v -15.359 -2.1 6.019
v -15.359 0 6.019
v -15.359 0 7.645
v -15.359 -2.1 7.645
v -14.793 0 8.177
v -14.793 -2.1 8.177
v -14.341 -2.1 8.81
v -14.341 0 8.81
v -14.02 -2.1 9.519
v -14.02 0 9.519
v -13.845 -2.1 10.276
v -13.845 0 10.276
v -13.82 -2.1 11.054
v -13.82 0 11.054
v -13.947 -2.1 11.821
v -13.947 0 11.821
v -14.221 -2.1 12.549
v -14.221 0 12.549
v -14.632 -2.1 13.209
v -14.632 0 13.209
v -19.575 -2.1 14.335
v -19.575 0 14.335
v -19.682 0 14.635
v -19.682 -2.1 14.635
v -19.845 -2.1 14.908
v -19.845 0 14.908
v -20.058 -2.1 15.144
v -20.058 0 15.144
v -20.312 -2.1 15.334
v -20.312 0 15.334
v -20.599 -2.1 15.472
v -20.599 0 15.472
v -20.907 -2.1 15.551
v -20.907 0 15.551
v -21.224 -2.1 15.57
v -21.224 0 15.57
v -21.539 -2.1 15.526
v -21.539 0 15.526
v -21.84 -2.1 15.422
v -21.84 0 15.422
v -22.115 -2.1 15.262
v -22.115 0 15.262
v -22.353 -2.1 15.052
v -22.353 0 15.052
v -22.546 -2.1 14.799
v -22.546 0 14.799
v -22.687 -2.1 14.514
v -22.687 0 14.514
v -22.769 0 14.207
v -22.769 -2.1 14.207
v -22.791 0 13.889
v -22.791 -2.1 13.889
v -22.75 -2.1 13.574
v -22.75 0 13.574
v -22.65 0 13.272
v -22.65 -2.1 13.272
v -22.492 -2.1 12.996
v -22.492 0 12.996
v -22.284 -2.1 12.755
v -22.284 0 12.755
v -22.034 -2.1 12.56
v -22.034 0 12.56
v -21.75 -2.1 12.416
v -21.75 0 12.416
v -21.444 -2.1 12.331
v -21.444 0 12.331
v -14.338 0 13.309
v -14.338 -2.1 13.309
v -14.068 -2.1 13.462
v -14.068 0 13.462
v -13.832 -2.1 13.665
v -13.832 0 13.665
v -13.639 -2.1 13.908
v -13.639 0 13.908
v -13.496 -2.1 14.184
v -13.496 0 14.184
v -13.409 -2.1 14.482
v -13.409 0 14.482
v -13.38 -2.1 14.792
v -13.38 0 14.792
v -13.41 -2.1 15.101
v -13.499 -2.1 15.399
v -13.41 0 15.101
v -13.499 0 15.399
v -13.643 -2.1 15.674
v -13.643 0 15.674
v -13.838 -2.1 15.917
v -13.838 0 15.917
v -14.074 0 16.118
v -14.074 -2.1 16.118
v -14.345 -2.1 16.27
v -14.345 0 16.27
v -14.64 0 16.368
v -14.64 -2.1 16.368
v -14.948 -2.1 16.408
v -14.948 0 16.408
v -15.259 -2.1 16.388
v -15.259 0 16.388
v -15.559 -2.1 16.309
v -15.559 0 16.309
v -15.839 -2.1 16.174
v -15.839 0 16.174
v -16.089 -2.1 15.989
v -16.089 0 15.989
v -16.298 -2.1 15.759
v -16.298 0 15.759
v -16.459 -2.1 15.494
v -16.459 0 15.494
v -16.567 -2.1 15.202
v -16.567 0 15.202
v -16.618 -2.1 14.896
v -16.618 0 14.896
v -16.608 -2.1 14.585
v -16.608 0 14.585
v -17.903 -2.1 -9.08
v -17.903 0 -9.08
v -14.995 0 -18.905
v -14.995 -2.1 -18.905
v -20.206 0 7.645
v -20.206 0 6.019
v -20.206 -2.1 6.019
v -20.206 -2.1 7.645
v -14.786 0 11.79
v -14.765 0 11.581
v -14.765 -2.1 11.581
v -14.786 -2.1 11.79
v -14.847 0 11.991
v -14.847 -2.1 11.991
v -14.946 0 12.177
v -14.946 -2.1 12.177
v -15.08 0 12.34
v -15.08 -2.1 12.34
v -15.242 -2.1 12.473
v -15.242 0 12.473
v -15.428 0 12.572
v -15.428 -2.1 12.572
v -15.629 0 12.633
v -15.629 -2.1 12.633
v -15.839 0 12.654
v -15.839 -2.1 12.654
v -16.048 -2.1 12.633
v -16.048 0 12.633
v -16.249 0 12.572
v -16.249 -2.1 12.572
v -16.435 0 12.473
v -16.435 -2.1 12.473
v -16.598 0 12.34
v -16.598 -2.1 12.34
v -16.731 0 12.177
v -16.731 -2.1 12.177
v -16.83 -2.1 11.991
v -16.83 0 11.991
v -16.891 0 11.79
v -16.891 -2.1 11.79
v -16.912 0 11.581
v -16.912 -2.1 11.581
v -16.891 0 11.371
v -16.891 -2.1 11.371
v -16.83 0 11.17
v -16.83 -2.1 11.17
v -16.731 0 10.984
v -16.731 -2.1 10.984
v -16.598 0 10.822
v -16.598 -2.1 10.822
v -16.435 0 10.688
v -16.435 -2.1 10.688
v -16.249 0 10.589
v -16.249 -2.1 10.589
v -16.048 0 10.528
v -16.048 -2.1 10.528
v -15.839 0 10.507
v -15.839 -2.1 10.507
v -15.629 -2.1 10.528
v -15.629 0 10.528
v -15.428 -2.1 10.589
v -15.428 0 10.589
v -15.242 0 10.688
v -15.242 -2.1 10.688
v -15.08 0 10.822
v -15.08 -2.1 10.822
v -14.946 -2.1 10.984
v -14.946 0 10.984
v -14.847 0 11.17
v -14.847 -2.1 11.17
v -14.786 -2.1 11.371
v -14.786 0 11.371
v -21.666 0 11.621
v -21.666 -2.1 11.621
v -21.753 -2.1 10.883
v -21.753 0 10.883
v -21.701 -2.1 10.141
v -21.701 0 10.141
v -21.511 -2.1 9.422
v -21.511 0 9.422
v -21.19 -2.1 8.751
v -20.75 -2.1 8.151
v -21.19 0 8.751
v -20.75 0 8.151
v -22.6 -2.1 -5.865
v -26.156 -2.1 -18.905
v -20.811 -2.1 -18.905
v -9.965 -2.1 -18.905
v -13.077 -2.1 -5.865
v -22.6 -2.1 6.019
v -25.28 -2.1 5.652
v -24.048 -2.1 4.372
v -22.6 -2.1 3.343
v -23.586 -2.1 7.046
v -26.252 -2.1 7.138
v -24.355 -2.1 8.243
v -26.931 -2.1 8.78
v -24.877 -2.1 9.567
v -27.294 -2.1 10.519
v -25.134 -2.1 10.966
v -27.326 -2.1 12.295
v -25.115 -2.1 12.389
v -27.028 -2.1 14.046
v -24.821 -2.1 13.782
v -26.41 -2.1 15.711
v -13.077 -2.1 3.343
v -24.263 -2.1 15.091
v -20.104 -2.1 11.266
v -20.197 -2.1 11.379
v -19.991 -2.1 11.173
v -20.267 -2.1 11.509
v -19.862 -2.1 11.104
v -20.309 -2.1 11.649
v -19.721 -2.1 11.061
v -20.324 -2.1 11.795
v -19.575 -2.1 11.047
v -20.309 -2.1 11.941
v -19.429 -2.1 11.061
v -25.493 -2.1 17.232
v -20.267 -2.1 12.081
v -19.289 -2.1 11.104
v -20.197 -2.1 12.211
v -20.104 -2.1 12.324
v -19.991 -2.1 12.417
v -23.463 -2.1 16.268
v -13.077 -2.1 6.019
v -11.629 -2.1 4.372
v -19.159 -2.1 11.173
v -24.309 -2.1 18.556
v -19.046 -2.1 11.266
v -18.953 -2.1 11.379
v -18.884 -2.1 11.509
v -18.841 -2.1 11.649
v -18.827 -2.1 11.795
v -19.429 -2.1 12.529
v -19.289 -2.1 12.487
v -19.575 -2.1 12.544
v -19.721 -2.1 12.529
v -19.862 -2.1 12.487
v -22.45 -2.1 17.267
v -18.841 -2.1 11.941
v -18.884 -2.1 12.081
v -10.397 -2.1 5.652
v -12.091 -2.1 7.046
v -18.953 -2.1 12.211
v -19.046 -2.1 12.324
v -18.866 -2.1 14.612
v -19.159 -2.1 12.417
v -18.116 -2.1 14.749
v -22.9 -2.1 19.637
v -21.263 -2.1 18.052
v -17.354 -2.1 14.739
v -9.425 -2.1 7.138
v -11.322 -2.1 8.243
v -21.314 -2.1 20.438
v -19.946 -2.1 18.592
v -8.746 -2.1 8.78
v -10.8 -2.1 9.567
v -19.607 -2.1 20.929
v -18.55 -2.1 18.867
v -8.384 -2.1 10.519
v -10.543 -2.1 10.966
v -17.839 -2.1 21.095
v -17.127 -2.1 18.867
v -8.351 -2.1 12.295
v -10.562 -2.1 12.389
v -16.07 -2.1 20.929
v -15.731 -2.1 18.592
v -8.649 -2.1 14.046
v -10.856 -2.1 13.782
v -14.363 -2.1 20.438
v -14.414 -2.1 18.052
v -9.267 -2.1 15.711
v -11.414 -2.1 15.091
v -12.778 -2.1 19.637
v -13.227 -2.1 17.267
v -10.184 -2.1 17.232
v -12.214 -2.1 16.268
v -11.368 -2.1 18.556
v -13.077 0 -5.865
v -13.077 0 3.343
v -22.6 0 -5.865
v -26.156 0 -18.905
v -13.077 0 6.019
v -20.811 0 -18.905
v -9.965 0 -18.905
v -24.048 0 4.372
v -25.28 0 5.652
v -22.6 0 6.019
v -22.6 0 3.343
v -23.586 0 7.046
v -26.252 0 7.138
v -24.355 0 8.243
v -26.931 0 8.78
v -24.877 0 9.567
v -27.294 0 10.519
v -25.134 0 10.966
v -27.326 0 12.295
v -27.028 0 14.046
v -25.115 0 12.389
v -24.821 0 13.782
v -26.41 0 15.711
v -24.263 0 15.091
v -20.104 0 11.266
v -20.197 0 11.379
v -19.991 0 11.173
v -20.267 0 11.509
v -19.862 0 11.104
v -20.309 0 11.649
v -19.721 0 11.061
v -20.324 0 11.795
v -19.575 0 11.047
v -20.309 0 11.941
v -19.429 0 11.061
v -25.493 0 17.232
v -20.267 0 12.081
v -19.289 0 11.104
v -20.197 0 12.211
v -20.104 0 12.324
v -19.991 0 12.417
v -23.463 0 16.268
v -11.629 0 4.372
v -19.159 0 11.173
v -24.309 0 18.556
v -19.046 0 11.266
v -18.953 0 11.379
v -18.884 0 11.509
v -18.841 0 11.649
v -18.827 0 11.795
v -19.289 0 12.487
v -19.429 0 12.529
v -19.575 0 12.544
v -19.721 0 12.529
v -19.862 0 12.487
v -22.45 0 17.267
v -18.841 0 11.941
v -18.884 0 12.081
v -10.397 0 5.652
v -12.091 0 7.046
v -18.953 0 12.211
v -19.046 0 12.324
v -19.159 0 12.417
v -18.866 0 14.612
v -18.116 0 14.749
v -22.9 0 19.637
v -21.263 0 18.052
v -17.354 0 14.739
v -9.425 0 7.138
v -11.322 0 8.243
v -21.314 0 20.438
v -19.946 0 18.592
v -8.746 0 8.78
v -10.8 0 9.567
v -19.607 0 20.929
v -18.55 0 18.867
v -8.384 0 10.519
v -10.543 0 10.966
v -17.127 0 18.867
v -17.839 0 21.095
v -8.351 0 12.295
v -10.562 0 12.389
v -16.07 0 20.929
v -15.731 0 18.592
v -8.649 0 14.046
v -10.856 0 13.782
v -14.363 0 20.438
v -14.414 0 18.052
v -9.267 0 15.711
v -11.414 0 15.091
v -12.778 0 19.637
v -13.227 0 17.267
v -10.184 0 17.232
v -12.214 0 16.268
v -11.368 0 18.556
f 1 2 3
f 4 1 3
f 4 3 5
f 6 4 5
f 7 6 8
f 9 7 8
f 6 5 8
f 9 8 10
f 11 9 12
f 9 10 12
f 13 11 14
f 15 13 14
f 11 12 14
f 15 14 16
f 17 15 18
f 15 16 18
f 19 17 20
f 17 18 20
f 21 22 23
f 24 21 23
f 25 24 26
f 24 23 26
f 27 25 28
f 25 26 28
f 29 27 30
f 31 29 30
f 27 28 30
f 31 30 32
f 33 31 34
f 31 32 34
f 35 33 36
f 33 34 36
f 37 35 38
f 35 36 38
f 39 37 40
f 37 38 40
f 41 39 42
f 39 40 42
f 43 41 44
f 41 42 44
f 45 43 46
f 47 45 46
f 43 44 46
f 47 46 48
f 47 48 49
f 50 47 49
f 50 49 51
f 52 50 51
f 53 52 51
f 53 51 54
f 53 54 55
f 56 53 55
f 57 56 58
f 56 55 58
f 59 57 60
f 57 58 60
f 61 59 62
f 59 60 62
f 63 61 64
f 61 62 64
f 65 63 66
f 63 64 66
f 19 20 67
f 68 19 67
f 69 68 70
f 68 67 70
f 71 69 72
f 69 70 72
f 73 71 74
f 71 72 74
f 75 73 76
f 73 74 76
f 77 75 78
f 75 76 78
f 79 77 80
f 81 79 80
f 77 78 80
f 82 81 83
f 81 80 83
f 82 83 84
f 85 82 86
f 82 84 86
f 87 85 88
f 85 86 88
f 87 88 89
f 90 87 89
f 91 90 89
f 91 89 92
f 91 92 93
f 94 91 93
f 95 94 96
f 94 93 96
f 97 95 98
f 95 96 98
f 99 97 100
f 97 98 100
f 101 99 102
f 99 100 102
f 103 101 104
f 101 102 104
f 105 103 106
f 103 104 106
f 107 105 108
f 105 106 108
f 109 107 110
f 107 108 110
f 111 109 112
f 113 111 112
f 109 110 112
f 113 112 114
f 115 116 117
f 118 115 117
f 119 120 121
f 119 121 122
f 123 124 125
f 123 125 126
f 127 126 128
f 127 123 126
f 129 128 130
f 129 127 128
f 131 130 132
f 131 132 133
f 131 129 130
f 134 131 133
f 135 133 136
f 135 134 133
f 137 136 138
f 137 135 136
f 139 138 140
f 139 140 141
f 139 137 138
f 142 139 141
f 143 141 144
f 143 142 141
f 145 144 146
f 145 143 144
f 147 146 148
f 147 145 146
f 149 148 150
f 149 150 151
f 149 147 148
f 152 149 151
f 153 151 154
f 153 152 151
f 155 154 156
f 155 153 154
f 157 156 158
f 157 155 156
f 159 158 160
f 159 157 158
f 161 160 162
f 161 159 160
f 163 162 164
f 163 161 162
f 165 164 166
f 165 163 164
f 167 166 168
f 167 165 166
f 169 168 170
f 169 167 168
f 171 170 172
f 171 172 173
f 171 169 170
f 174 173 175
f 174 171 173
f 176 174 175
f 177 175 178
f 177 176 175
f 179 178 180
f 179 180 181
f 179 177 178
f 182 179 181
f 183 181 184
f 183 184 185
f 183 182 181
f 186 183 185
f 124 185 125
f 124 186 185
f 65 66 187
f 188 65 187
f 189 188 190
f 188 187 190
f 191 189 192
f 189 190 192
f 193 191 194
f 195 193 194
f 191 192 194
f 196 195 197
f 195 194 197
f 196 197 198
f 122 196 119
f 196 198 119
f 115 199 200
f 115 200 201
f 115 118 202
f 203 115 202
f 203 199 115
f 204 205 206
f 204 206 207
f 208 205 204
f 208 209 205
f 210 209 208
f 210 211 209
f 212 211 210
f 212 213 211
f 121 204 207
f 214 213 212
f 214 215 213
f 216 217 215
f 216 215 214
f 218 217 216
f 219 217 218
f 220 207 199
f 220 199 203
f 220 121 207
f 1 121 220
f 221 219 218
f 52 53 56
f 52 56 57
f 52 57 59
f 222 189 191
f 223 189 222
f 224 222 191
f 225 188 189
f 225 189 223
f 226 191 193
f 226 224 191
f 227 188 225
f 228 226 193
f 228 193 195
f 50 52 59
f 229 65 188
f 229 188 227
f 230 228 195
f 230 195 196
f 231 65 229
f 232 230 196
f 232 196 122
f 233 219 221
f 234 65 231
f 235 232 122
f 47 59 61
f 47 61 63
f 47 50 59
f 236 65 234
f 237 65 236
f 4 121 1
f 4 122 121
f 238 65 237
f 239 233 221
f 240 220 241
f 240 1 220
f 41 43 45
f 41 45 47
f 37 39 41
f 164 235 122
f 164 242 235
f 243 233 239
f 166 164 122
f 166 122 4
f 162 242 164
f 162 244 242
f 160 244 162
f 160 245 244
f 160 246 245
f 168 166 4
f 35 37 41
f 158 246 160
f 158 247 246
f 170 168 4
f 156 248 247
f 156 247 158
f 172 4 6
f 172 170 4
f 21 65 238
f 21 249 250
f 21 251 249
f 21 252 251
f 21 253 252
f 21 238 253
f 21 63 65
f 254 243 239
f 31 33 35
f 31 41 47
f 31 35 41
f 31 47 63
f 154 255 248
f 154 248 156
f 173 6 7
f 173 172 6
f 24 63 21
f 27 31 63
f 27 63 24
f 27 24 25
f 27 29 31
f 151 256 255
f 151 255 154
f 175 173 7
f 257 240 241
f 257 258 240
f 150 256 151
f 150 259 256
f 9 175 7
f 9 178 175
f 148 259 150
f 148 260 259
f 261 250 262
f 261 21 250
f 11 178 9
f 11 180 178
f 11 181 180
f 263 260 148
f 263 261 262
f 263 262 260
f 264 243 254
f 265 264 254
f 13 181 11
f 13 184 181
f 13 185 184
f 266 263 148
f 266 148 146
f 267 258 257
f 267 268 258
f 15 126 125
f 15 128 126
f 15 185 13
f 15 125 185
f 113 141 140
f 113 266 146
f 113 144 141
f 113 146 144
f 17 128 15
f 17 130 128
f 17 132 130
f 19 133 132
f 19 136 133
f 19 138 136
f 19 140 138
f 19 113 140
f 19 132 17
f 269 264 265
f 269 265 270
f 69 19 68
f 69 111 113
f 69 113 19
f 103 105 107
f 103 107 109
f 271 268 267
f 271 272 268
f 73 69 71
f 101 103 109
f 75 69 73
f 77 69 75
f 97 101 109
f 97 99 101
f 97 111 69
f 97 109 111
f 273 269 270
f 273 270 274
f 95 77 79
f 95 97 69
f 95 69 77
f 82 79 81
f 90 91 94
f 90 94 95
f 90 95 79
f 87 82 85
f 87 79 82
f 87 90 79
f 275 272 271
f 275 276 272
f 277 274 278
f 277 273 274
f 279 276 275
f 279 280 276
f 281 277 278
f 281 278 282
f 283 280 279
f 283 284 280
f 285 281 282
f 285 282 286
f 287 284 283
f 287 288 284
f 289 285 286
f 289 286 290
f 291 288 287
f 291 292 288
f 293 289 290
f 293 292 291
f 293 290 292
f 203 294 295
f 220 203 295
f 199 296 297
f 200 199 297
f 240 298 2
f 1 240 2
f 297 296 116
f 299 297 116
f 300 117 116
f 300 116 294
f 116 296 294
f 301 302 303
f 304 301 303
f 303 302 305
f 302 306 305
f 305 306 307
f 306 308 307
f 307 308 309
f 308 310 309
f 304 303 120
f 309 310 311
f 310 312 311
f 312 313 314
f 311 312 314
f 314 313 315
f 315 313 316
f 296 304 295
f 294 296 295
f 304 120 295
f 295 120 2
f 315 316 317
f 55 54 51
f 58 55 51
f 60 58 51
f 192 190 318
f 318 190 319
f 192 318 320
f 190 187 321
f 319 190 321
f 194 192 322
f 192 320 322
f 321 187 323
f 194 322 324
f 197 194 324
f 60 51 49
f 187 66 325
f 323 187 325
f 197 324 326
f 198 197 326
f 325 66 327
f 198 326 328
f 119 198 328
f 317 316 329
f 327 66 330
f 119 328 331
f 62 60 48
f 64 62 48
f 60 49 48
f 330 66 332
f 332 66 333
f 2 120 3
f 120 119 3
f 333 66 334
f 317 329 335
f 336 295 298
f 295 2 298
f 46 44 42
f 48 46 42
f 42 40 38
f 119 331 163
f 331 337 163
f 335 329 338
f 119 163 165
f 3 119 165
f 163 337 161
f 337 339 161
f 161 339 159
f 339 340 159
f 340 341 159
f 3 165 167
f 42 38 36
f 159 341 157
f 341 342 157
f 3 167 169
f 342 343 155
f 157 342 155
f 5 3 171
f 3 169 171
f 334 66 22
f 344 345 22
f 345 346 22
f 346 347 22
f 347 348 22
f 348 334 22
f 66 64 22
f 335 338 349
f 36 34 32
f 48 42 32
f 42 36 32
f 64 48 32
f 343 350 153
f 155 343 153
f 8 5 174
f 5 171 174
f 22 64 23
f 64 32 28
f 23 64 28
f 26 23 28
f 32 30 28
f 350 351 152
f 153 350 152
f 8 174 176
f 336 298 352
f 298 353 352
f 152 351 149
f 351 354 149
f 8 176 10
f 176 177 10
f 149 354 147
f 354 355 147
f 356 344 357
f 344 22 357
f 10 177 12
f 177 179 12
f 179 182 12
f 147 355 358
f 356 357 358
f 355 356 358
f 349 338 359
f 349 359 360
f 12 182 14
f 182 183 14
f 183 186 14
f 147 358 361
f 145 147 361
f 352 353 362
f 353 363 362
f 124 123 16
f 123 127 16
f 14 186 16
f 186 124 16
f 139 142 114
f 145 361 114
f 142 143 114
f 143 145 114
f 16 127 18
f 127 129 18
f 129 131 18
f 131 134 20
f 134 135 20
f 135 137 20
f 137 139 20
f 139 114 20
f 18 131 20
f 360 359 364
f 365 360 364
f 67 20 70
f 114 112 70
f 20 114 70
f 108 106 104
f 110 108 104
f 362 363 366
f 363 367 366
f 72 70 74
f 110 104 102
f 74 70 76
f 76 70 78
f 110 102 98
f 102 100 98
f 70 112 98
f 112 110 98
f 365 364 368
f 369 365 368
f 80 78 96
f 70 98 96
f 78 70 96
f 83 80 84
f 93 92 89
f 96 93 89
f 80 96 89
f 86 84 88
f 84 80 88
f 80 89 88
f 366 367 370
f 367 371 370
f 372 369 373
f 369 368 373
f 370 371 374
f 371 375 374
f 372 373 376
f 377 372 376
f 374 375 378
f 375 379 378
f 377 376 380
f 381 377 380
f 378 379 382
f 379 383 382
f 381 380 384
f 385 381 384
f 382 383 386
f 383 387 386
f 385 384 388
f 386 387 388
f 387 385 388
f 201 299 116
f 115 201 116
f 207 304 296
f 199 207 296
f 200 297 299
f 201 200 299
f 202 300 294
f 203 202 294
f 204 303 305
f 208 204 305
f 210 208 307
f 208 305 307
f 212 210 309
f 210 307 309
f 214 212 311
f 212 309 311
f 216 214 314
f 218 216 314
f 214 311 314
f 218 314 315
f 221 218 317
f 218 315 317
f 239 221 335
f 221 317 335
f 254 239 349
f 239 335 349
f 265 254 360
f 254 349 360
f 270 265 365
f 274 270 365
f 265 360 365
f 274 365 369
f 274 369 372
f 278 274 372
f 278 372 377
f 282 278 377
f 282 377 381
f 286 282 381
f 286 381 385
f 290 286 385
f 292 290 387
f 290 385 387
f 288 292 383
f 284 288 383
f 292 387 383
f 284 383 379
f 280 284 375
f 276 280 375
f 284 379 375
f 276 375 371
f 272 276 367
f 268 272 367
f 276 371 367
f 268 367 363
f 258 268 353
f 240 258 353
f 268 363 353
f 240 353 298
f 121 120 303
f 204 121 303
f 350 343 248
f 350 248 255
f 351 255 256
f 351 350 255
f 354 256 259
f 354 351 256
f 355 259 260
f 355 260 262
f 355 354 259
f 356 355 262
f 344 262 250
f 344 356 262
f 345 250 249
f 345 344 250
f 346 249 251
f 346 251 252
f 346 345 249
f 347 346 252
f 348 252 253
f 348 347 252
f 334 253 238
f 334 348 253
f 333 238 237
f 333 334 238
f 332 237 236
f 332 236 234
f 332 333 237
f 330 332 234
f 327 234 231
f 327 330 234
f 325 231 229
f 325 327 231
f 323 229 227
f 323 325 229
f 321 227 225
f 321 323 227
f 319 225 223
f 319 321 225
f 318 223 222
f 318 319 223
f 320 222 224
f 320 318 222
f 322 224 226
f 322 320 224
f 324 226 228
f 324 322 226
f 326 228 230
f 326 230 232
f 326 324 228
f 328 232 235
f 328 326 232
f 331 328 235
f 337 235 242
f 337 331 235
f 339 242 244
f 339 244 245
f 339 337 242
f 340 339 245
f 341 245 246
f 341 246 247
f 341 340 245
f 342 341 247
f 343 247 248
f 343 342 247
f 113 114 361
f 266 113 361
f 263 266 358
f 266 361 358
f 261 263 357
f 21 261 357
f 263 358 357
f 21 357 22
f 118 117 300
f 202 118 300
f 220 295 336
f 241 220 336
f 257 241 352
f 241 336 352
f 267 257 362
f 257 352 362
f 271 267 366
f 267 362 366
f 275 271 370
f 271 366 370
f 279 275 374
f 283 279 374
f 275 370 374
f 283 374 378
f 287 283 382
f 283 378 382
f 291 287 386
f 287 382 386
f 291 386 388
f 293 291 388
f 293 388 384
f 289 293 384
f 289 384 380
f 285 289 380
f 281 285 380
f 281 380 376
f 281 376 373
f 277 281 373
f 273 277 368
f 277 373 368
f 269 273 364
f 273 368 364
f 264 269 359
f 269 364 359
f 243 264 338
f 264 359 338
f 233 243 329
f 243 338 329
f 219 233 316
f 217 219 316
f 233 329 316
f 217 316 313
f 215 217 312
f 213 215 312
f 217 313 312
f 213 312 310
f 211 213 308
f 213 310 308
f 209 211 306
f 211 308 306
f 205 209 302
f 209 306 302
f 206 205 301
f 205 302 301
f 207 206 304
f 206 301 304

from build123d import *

# Parameters (mm, degrees)
F0_R     = 0.748499
F0_R_2   = 1.073278
F0_W     = 4.846455
F0_H     = 1.625112
F1_DEPTH = 2.1


with BuildPart() as f1:
    # F0 (on Front) → F1 (new body)
    with BuildSketch(Plane.XZ):
        with BuildLine():
            ThreePointArc((-21.443578, 12.330635), (-21.622454, 9.776879), (-20.205865, 7.644522))
            Line((-20.205865, 7.644522), (-15.35941, 7.644522))
            ThreePointArc((-15.35941, 7.644522), (-13.844625, 10.276462), (-14.632234, 13.209269))
            ThreePointArc((-14.632234, 13.209269), (-15.513563, 14.050521), (-16.608446, 14.585011))
            ThreePointArc((-16.608446, 14.585011), (-18.11609, 14.748534), (-19.575115, 14.335043))
            ThreePointArc((-19.575115, 14.335043), (-20.687694, 13.49909), (-21.443578, 12.330635))
        make_face()
        with Locations((-19.575115, 11.795032)):
            Circle(F0_R, mode=Mode.SUBTRACT)
        with Locations((-15.838588, 11.580638)):
            Circle(F0_R_2, mode=Mode.SUBTRACT)
        Polygon((-15.35941, 6.01941), (-20.205865, 6.01941), (-22.600182, 6.01941), (-22.600182, 3.343472), (-22.600182, -5.8649), (-13.076994, -5.8649), (-13.076994, 3.343472), (-13.076994, 6.01941), align=None)
        with BuildLine():
            Line((-22.600182, 3.343472), (-22.600182, 6.01941))
            ThreePointArc((-22.600182, 6.01941), (-17.838588, 18.901843), (-13.076994, 6.01941))
            Line((-13.076994, 6.01941), (-13.076994, 3.343472))
            ThreePointArc((-13.076994, 3.343472), (-17.838588, 21.095032), (-22.600182, 3.343472))
        make_face()
        Polygon((-13.076994, -5.8649), (-22.600182, -5.8649), (-26.155973, -18.904968), (-20.811403, -18.904968), (-17.903329, -9.080392), (-14.995254, -18.904968), (-9.965071, -18.904968), align=None)
        with Locations((-17.782637, 6.831966)):
            Rectangle(F0_W, F0_H)
        with BuildLine():
            ThreePointArc((-19.575115, 14.335043), (-22.353082, 15.051527), (-21.443578, 12.330635))
            ThreePointArc((-21.443578, 12.330635), (-20.687694, 13.49909), (-19.575115, 14.335043))
        make_face()
        with BuildLine():
            ThreePointArc((-16.608446, 14.585011), (-15.513563, 14.050521), (-14.632234, 13.209269))
            ThreePointArc((-14.632234, 13.209269), (-14.074413, 16.117817), (-16.608446, 14.585011))
        make_face()
    extrude(amount=F1_DEPTH)


solid = f1.part
